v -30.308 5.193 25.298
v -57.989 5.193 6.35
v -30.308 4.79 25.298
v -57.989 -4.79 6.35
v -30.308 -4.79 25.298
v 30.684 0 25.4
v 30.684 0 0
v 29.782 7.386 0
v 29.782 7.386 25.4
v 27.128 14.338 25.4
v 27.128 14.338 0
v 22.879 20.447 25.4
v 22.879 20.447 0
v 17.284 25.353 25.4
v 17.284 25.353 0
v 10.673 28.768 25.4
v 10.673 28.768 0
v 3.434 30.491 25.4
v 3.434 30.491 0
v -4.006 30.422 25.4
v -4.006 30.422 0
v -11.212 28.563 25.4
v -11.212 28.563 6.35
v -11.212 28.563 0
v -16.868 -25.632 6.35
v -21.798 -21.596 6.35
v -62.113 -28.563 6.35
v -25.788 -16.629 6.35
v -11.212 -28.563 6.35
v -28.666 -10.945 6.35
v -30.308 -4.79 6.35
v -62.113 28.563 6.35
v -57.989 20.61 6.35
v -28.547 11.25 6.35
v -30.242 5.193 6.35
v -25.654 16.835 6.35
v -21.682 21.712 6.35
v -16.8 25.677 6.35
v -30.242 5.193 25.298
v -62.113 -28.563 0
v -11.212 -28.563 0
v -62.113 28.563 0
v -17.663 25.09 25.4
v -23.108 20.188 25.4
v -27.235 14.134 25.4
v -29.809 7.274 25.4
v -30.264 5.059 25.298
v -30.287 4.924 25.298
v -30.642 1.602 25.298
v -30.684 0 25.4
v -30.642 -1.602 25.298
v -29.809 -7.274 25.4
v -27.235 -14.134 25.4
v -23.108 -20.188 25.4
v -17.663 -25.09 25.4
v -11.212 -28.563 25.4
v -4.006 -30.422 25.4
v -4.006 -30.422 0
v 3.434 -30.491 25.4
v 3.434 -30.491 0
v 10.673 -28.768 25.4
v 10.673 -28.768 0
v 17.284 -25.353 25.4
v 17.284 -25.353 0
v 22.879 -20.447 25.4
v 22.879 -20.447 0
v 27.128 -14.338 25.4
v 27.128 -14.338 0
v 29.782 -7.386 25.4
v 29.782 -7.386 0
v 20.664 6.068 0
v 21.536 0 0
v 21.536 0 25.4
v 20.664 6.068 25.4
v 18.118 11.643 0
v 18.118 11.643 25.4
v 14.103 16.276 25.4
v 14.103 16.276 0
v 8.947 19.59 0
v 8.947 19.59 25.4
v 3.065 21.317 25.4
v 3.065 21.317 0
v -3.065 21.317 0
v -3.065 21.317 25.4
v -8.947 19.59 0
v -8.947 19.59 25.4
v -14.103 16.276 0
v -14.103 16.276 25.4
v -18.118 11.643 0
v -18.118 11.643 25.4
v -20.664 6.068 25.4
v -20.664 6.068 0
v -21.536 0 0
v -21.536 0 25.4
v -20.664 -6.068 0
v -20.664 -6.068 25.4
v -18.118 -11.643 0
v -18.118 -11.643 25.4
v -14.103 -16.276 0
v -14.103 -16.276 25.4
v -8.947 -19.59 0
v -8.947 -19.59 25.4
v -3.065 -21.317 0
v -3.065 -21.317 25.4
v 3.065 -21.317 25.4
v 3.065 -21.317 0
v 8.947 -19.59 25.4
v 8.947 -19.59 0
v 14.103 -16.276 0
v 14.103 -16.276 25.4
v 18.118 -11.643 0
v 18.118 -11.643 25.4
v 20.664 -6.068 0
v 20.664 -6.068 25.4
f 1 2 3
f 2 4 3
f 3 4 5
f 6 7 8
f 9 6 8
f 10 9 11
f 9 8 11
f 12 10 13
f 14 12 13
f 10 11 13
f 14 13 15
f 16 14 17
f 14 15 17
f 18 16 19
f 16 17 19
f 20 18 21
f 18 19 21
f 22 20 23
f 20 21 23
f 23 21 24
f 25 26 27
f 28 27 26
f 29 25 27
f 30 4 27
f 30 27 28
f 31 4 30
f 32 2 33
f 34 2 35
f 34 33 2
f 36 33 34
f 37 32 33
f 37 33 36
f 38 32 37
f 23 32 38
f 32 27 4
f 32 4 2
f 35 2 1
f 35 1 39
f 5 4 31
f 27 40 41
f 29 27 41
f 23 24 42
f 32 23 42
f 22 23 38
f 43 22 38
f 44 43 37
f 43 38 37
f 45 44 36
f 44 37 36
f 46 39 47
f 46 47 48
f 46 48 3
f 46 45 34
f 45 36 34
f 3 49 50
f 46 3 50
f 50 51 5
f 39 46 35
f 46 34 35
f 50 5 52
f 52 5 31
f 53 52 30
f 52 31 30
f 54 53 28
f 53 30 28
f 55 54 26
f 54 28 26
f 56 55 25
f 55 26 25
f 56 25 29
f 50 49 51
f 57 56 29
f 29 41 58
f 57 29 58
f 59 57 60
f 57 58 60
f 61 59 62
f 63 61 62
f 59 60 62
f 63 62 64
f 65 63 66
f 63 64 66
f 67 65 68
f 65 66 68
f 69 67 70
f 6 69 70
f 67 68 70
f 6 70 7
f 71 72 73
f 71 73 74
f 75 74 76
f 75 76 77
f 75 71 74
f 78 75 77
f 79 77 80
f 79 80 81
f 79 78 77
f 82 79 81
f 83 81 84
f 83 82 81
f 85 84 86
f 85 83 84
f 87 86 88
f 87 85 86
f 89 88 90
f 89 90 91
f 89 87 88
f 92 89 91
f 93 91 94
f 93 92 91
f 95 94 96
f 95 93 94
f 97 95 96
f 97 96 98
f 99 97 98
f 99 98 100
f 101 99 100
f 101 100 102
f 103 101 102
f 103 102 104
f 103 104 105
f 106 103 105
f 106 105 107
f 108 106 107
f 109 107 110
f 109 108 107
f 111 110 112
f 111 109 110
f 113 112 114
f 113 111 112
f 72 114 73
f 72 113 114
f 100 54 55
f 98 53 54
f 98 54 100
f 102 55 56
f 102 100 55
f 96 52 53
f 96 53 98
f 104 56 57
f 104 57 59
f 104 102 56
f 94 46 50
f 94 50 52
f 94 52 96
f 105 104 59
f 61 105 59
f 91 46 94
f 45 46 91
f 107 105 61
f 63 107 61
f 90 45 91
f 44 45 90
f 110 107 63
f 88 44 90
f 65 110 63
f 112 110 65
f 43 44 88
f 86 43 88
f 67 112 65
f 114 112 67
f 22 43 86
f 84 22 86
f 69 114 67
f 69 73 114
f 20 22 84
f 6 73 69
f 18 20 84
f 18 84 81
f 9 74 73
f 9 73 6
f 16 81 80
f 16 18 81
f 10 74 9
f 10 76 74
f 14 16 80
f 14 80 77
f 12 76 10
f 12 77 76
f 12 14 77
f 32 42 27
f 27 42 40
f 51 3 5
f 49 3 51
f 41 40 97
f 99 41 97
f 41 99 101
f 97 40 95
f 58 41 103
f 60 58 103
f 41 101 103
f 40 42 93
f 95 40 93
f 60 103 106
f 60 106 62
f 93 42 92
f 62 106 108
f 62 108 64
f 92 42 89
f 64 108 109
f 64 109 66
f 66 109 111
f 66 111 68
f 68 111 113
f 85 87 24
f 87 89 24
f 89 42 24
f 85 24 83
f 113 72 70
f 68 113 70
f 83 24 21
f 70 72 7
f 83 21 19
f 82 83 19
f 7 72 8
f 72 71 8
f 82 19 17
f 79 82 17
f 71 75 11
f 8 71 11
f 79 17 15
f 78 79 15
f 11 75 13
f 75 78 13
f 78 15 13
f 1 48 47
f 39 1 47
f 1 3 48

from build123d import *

# Parameters (mm, degrees)
F1_DEPTH = 6.35
F0_R     = 21.5364
F2_DEPTH = 25.4
F3_W     = 27.747467
F3_H     = 9.982902
F4_DEPTH = 18.9484
F6_DEPTH = 25.4


with BuildPart() as f1:
    # F0 (on Top) → F1 (new body)
    with BuildSketch(Plane.XY):
        with BuildLine():
            ThreePointArc((-11.211676, -28.56255), (-30.684213, 0), (-11.211676, 28.56255))
            Line((-11.211676, 28.56255), (-62.113033, 28.56255))
            Line((-62.113033, 28.56255), (-62.113033, -28.56255))
            Line((-62.113033, -28.56255), (-11.211676, -28.56255))
        make_face()
    extrude(amount=F1_DEPTH)

    # F0 (on Top) → F2 (join)
    with BuildSketch(Plane.XY):
        with BuildLine():
            ThreePointArc((-11.211676, -28.56255), (17.284379, -25.352933), (30.684213, 0))
            ThreePointArc((30.684213, 0), (17.284379, 25.352933), (-11.211676, 28.56255))
            ThreePointArc((-11.211676, 28.56255), (-30.684213, 0), (-11.211676, -28.56255))
        make_face()
        Circle(F0_R, mode=Mode.SUBTRACT)
    extrude(amount=F2_DEPTH)

    # F3 (on face) → F4 (join)
    with BuildSketch(Plane.XY.offset(6.35)):
        with Locations((-44.115293, 0.20172)):
            Rectangle(F3_W, F3_H)
    extrude(amount=F4_DEPTH)

    # F5 (on face) → F6 (cut)
    with BuildSketch(Plane.XZ.offset(4.789731)):
        Polygon((-57.989027, 6.35), (-30.308075, 25.2984), (-57.989027, 25.2984), align=None)
    extrude(amount=-F6_DEPTH, mode=Mode.SUBTRACT)


solid = f1.part
